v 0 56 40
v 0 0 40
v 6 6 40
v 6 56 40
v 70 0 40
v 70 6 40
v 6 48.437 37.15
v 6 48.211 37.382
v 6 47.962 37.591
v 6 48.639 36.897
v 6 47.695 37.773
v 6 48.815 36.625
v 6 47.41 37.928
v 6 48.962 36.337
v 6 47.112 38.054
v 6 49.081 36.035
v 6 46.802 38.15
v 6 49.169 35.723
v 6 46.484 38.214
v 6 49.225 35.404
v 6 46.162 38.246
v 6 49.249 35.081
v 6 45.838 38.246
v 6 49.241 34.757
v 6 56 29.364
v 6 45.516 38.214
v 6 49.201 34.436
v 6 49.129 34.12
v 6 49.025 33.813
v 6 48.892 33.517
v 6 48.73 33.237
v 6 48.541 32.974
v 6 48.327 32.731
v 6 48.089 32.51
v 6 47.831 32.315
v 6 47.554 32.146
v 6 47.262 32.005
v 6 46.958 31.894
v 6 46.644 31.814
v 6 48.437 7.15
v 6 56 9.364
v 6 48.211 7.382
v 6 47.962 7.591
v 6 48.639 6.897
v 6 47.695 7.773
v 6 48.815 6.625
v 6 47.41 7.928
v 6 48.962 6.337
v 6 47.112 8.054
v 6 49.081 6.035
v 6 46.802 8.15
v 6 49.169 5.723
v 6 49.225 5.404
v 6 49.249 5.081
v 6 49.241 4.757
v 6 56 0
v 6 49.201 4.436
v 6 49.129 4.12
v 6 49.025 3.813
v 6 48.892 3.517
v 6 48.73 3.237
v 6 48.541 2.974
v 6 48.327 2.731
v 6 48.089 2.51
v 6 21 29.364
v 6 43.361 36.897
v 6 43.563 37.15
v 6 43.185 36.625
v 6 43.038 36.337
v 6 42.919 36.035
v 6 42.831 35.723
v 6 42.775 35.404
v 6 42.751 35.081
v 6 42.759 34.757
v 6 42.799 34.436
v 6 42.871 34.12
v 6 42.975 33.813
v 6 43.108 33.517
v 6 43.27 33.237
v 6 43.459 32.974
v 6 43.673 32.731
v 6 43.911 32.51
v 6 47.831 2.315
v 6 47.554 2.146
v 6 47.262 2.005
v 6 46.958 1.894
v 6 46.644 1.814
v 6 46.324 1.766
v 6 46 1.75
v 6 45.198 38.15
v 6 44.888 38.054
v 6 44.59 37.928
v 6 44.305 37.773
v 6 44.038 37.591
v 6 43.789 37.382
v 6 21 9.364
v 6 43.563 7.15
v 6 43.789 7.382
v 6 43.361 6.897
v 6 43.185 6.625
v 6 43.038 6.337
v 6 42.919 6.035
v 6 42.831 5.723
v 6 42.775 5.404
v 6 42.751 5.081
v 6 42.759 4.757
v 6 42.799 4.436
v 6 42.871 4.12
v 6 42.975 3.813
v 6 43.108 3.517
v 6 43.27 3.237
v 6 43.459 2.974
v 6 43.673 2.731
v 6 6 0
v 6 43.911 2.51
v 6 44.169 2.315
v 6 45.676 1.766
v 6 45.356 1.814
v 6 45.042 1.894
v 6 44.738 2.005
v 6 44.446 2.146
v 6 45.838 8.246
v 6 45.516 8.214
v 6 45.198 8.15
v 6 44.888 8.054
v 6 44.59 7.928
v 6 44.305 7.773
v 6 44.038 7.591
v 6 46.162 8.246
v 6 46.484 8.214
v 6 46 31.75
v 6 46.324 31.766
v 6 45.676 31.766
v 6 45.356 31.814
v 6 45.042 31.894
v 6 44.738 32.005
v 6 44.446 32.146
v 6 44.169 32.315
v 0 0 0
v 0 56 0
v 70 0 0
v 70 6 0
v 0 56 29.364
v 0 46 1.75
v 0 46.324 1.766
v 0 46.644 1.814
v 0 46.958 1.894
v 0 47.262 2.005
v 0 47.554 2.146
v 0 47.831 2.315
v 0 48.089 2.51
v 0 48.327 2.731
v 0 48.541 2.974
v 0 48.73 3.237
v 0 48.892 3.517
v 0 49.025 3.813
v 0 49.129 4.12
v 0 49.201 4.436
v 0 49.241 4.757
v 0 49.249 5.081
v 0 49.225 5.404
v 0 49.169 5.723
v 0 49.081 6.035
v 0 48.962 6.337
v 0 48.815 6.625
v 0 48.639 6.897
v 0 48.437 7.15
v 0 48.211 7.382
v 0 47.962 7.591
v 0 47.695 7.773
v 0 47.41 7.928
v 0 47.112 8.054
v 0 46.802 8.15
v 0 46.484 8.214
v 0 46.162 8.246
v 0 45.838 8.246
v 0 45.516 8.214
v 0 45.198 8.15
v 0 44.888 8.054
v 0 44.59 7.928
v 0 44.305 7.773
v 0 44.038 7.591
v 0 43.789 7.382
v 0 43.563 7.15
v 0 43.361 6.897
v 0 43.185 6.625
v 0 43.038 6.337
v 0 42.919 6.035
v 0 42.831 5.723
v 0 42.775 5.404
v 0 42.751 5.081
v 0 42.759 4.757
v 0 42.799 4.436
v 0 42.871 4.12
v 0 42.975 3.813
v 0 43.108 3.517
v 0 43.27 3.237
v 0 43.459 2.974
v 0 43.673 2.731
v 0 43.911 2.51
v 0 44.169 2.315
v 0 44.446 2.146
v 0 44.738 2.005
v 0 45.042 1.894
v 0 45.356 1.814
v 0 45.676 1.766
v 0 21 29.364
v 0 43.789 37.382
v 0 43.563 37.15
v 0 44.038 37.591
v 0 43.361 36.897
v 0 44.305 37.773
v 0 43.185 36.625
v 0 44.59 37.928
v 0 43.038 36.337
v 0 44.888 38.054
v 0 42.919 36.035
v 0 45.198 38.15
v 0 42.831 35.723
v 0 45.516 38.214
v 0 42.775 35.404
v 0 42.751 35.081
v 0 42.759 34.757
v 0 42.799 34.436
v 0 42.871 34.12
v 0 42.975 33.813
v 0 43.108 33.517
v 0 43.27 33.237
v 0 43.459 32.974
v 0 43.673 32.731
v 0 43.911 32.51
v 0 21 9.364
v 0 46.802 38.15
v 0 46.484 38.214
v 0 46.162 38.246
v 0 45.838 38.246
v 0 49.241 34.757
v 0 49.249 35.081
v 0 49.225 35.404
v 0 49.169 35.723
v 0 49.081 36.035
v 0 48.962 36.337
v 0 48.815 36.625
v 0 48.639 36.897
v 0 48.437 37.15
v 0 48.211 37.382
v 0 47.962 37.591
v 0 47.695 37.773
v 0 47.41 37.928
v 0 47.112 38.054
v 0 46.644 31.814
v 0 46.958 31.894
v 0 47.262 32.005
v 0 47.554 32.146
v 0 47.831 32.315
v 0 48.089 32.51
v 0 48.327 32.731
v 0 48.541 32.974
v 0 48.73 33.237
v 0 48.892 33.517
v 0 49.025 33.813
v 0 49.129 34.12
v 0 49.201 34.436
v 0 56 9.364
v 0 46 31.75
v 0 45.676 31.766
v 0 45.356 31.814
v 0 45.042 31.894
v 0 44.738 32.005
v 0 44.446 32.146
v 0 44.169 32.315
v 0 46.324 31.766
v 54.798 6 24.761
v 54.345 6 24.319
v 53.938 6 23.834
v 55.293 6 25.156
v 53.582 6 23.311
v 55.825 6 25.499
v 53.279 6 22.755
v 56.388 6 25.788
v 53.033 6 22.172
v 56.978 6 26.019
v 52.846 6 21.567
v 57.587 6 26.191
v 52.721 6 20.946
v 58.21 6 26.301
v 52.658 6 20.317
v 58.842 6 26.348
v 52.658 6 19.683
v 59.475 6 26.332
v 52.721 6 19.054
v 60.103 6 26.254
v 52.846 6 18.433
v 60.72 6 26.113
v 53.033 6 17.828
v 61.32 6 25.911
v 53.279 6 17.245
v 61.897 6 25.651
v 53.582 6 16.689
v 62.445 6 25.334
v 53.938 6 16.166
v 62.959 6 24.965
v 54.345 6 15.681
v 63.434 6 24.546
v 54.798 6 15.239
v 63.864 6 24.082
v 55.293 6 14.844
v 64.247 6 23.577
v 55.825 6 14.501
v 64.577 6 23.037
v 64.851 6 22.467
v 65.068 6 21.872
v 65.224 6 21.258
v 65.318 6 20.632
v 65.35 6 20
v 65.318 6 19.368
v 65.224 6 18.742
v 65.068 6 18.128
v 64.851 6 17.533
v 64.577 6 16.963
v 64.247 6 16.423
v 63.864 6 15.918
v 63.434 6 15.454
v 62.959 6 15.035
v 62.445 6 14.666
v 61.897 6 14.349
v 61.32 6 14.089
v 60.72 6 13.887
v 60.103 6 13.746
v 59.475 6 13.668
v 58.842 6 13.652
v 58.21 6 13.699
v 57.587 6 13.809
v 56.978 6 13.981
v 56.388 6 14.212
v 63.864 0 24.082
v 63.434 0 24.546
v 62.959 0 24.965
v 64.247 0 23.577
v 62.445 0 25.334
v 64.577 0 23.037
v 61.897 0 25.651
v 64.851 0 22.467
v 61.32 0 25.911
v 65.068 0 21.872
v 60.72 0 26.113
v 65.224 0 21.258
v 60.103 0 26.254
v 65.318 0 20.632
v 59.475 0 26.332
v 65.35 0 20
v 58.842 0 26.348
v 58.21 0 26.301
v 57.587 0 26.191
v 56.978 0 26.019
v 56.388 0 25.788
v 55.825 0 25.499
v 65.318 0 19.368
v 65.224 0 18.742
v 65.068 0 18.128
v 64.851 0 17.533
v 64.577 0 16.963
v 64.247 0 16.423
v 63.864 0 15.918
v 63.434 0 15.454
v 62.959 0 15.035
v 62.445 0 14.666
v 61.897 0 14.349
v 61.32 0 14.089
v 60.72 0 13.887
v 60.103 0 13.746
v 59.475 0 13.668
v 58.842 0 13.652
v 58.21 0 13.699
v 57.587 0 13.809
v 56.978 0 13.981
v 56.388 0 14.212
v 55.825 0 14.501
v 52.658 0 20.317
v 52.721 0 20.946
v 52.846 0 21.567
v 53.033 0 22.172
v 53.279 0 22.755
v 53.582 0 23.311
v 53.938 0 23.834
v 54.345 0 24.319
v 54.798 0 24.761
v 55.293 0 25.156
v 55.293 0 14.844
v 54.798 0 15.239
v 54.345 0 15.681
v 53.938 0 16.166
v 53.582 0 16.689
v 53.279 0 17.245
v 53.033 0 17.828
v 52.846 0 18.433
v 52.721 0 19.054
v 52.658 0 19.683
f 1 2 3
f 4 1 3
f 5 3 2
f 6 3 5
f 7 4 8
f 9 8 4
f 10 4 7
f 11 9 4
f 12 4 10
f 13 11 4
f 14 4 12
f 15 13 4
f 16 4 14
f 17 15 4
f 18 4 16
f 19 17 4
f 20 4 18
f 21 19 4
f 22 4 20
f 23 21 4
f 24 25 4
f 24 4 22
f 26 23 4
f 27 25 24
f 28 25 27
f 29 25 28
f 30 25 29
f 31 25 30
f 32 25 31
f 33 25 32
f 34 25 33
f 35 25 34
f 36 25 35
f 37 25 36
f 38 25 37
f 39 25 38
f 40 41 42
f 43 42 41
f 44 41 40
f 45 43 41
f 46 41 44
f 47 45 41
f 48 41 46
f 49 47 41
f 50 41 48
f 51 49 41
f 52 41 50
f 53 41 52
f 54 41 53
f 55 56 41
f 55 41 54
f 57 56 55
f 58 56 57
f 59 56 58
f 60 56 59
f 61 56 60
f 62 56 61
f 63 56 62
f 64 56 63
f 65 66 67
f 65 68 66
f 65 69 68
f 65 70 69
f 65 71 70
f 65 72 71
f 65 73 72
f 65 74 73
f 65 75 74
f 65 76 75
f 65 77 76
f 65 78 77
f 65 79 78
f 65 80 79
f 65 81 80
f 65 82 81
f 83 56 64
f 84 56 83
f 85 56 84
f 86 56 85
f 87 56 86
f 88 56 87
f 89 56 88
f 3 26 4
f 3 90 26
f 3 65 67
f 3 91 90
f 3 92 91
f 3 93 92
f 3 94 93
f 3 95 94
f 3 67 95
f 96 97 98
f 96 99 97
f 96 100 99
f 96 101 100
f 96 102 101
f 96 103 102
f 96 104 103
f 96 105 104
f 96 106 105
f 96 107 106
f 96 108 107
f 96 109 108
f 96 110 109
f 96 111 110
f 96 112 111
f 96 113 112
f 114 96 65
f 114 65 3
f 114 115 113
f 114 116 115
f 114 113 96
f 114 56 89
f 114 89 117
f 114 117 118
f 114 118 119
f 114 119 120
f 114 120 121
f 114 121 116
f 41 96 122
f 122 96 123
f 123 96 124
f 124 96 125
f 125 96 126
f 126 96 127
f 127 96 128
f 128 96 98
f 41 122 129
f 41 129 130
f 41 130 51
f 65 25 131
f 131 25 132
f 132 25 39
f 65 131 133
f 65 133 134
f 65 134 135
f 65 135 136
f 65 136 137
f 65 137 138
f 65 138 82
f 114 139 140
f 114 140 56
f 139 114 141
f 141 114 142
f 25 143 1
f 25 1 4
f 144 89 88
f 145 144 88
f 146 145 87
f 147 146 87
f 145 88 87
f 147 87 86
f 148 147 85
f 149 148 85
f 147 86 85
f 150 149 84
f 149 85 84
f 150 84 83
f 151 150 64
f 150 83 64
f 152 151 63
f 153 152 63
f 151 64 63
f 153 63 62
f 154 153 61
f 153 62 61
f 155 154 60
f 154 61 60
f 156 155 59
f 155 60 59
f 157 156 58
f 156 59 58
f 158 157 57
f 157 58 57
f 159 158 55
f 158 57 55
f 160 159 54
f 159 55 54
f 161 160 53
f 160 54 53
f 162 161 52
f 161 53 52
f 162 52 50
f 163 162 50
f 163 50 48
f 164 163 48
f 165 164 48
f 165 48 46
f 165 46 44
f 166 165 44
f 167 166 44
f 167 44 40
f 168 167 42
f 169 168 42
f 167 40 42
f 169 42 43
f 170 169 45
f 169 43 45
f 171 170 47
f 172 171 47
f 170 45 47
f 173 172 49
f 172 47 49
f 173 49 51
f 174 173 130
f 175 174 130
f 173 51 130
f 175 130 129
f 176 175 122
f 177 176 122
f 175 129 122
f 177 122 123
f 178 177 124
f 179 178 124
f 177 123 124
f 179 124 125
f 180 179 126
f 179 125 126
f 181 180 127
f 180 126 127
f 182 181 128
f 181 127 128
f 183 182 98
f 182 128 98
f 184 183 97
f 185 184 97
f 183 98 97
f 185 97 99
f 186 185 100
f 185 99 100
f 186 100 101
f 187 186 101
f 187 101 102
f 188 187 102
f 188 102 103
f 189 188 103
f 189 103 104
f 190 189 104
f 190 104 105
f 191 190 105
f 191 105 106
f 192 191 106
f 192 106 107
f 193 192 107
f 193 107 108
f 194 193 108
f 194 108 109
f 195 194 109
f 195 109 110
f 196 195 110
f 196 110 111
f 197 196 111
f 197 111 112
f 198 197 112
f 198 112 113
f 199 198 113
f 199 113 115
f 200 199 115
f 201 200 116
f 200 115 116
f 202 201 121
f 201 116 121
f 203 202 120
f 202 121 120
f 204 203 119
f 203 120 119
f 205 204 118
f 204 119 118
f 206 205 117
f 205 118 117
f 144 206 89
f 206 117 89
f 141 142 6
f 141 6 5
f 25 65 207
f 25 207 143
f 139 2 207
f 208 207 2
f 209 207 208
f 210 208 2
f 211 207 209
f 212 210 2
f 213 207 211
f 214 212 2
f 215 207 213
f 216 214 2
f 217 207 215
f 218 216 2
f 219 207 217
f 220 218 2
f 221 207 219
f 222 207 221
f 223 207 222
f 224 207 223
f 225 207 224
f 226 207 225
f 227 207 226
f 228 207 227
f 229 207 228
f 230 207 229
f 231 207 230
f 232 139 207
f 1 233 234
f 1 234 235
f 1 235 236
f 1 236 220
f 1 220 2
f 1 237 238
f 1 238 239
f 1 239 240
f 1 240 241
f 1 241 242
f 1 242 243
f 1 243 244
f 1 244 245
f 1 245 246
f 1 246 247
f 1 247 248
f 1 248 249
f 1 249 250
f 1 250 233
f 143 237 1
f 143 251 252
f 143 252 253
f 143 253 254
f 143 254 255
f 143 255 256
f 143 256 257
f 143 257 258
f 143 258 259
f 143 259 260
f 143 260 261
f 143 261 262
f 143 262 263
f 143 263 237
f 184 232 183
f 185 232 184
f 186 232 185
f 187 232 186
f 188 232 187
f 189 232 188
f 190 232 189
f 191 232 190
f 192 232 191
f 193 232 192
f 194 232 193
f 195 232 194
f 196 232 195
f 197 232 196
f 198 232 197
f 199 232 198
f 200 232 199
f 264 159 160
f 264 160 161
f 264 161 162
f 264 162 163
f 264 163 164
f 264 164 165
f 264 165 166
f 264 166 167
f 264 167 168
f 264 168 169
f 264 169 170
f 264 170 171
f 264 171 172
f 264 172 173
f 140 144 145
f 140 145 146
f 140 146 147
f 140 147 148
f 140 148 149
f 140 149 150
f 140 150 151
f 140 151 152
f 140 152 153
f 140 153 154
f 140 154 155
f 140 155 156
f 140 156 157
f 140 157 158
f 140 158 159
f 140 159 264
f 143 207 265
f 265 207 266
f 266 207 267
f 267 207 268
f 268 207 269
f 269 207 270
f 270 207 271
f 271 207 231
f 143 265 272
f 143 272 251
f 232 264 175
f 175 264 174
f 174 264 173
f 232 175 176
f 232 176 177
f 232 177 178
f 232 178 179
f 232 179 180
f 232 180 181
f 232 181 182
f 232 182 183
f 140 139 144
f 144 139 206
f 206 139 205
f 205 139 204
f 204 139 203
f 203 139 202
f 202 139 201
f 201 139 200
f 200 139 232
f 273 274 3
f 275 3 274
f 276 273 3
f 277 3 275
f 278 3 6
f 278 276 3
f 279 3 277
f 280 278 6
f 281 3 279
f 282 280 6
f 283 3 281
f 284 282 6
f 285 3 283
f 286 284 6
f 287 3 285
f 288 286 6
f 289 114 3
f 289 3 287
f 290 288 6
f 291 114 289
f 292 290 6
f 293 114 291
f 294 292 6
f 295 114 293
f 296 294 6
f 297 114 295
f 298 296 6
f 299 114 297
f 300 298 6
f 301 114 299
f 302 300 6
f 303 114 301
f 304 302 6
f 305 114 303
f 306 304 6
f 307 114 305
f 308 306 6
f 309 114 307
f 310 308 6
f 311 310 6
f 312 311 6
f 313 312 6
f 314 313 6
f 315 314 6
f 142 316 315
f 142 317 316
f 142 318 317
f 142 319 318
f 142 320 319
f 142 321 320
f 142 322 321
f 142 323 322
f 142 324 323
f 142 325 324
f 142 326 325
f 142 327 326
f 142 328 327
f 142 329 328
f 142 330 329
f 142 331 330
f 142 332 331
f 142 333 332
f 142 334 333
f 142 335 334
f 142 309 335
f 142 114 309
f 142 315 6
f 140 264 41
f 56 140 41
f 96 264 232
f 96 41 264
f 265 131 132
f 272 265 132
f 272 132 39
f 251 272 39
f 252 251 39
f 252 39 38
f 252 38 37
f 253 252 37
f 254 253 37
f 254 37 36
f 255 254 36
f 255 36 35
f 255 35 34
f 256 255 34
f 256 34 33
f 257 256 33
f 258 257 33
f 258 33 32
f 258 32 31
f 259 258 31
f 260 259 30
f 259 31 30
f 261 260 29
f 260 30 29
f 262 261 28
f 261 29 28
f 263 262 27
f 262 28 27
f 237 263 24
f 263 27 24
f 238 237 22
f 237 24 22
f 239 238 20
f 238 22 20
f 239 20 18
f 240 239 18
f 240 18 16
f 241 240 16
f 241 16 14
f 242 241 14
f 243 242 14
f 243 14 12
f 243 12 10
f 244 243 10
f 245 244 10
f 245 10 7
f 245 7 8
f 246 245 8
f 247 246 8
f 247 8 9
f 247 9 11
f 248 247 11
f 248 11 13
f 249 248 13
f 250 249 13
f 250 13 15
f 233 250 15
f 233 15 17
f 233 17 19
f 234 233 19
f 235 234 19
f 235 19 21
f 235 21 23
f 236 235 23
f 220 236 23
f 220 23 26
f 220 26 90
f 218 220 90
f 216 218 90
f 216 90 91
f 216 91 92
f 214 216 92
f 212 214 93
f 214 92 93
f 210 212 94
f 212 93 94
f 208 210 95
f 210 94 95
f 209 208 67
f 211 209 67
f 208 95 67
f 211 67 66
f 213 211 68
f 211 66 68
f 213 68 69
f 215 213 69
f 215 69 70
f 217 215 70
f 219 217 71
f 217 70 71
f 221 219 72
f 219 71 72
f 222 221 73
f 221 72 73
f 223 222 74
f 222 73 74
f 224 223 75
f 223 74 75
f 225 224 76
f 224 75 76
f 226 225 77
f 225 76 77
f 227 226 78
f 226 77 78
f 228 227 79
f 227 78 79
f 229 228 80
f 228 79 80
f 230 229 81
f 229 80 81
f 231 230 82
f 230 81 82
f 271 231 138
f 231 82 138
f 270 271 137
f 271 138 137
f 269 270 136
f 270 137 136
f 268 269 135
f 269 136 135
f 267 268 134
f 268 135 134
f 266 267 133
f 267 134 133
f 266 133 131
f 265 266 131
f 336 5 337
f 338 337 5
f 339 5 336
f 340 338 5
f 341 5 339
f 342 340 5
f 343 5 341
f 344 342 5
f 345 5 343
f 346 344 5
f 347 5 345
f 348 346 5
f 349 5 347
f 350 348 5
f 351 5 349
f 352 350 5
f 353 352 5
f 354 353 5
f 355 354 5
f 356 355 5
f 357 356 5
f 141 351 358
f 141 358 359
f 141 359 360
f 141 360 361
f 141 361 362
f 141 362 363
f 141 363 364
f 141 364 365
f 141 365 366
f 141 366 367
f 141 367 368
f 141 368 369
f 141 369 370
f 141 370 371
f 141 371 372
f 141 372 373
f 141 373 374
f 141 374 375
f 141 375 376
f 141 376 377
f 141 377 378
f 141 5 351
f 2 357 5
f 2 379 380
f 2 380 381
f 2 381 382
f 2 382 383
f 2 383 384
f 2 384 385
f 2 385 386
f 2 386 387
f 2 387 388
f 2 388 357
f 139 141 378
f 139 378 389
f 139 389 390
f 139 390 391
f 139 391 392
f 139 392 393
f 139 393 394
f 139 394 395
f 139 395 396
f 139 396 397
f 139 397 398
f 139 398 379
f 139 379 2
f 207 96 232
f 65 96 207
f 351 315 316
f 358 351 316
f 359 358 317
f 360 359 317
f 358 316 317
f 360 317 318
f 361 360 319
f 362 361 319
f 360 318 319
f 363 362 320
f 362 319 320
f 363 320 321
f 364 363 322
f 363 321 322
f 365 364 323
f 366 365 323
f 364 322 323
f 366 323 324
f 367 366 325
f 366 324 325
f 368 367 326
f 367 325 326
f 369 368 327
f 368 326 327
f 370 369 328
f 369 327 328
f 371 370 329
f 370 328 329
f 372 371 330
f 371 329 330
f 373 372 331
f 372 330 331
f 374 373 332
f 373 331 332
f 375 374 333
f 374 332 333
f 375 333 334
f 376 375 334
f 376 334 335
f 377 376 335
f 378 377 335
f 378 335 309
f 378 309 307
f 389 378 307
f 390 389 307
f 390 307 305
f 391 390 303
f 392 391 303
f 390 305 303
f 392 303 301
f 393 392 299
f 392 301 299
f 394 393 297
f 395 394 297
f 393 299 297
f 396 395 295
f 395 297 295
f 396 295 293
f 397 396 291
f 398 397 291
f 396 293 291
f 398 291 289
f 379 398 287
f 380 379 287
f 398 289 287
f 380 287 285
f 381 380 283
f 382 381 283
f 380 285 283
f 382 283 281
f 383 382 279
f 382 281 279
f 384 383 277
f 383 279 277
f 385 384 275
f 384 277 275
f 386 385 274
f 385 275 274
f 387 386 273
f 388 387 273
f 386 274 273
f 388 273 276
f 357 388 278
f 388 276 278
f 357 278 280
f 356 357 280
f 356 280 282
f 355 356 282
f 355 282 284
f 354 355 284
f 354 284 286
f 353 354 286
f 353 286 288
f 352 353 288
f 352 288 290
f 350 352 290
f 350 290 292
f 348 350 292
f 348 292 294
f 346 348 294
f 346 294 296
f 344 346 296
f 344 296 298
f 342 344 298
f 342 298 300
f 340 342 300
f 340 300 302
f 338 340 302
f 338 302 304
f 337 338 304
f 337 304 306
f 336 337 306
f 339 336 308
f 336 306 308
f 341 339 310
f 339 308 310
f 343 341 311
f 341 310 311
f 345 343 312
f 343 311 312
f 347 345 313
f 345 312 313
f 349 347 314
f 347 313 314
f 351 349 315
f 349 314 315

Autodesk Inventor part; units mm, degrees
ref_plane "YZ Plane" through (0, 0, 0) normal (1, 0, 0) x (0, 1, 0)
ref_plane "XZ Plane" through (0, 0, 0) normal (0, 1, 0) x (-1, 0, 0)
ref_plane "XY Plane" through (0, 0, 0) normal (0, 0, 1) x (1, 0, 0)
sketch "Sketch1" plane through (0, 0, 0) normal (0, 0, 1) x (1, 0, 0)
  line L0 (0, 0) -> (0, 56)
  line L1 (0, 56) -> (6, 56)
  line L2 (6, 56) -> (6, 6)
  line L3 (6, 6) -> (70, 6)
  line L4 (70, 6) -> (70, 0)
  line L5 (70, 0) -> (0, 0)
  dimension "d0" = 56
  dimension "d1" = 6
  dimension "d2" = 50
  dimension "d3" = 64
  dimension "d4" = 6
extrude "Extrusion1" add sketch "Sketch1" along normal blind 40
sketch "Sketch2" plane through (6, 6, 0) normal (0, 1, 0) x (1, 0, 0)
  line L0 (0, 0) -> (0, -40) projected
  circle A0 centre (53, -20) radius 6.35
  line L1 (64, 0) -> (0, 0) projected
  line L2 (64, -40) -> (0, -40) projected
  point P0 (-6, 0)
  dimension "d8" = 12.7
  dimension "d25" = 53
extrude "Extrusion2" cut sketch "Sketch2" against normal blind 40
sketch "Sketch3" plane through (6, 6, 0) normal (1, 0, 0) x (0, 0, -1)
  line L0 (0, 50) -> (-40, 50) projected
  line L1 (-29.3643, 50) -> (-9.3643, 50)
  line L2 (-9.3643, 50) -> (-9.3643, 15)
  line L3 (-9.3643, 15) -> (-29.3643, 15)
  line L4 (-29.3643, 15) -> (-29.3643, 50)
  point P0 (0, -6)
  dimension "d13" = 20
  dimension "d14" = 35
extrude "Extrusion3" cut sketch "Sketch3" against normal blind 10
sketch "Sketch4" plane through (6, 6, 0) normal (1, 0, 0) x (0, 0, -1)
  circle A0 centre (-35, 40) radius 3.25
  line L0 (-40, 0) -> (-40, 50) projected
  line L1 (-29.3643, 50) -> (-40, 50) projected
  point P0 (0, -6)
  dimension "d17" = 6.5
  dimension "d18" = 5
  dimension "d19" = 10
extrude "Extrusion4" cut sketch "Sketch4" against normal blind 10
pattern_linear "Rectangular Pattern1" count 2 spacing 30 along (0, 0, -1) of "Extrusion4"
properties part number "motor_angle"
